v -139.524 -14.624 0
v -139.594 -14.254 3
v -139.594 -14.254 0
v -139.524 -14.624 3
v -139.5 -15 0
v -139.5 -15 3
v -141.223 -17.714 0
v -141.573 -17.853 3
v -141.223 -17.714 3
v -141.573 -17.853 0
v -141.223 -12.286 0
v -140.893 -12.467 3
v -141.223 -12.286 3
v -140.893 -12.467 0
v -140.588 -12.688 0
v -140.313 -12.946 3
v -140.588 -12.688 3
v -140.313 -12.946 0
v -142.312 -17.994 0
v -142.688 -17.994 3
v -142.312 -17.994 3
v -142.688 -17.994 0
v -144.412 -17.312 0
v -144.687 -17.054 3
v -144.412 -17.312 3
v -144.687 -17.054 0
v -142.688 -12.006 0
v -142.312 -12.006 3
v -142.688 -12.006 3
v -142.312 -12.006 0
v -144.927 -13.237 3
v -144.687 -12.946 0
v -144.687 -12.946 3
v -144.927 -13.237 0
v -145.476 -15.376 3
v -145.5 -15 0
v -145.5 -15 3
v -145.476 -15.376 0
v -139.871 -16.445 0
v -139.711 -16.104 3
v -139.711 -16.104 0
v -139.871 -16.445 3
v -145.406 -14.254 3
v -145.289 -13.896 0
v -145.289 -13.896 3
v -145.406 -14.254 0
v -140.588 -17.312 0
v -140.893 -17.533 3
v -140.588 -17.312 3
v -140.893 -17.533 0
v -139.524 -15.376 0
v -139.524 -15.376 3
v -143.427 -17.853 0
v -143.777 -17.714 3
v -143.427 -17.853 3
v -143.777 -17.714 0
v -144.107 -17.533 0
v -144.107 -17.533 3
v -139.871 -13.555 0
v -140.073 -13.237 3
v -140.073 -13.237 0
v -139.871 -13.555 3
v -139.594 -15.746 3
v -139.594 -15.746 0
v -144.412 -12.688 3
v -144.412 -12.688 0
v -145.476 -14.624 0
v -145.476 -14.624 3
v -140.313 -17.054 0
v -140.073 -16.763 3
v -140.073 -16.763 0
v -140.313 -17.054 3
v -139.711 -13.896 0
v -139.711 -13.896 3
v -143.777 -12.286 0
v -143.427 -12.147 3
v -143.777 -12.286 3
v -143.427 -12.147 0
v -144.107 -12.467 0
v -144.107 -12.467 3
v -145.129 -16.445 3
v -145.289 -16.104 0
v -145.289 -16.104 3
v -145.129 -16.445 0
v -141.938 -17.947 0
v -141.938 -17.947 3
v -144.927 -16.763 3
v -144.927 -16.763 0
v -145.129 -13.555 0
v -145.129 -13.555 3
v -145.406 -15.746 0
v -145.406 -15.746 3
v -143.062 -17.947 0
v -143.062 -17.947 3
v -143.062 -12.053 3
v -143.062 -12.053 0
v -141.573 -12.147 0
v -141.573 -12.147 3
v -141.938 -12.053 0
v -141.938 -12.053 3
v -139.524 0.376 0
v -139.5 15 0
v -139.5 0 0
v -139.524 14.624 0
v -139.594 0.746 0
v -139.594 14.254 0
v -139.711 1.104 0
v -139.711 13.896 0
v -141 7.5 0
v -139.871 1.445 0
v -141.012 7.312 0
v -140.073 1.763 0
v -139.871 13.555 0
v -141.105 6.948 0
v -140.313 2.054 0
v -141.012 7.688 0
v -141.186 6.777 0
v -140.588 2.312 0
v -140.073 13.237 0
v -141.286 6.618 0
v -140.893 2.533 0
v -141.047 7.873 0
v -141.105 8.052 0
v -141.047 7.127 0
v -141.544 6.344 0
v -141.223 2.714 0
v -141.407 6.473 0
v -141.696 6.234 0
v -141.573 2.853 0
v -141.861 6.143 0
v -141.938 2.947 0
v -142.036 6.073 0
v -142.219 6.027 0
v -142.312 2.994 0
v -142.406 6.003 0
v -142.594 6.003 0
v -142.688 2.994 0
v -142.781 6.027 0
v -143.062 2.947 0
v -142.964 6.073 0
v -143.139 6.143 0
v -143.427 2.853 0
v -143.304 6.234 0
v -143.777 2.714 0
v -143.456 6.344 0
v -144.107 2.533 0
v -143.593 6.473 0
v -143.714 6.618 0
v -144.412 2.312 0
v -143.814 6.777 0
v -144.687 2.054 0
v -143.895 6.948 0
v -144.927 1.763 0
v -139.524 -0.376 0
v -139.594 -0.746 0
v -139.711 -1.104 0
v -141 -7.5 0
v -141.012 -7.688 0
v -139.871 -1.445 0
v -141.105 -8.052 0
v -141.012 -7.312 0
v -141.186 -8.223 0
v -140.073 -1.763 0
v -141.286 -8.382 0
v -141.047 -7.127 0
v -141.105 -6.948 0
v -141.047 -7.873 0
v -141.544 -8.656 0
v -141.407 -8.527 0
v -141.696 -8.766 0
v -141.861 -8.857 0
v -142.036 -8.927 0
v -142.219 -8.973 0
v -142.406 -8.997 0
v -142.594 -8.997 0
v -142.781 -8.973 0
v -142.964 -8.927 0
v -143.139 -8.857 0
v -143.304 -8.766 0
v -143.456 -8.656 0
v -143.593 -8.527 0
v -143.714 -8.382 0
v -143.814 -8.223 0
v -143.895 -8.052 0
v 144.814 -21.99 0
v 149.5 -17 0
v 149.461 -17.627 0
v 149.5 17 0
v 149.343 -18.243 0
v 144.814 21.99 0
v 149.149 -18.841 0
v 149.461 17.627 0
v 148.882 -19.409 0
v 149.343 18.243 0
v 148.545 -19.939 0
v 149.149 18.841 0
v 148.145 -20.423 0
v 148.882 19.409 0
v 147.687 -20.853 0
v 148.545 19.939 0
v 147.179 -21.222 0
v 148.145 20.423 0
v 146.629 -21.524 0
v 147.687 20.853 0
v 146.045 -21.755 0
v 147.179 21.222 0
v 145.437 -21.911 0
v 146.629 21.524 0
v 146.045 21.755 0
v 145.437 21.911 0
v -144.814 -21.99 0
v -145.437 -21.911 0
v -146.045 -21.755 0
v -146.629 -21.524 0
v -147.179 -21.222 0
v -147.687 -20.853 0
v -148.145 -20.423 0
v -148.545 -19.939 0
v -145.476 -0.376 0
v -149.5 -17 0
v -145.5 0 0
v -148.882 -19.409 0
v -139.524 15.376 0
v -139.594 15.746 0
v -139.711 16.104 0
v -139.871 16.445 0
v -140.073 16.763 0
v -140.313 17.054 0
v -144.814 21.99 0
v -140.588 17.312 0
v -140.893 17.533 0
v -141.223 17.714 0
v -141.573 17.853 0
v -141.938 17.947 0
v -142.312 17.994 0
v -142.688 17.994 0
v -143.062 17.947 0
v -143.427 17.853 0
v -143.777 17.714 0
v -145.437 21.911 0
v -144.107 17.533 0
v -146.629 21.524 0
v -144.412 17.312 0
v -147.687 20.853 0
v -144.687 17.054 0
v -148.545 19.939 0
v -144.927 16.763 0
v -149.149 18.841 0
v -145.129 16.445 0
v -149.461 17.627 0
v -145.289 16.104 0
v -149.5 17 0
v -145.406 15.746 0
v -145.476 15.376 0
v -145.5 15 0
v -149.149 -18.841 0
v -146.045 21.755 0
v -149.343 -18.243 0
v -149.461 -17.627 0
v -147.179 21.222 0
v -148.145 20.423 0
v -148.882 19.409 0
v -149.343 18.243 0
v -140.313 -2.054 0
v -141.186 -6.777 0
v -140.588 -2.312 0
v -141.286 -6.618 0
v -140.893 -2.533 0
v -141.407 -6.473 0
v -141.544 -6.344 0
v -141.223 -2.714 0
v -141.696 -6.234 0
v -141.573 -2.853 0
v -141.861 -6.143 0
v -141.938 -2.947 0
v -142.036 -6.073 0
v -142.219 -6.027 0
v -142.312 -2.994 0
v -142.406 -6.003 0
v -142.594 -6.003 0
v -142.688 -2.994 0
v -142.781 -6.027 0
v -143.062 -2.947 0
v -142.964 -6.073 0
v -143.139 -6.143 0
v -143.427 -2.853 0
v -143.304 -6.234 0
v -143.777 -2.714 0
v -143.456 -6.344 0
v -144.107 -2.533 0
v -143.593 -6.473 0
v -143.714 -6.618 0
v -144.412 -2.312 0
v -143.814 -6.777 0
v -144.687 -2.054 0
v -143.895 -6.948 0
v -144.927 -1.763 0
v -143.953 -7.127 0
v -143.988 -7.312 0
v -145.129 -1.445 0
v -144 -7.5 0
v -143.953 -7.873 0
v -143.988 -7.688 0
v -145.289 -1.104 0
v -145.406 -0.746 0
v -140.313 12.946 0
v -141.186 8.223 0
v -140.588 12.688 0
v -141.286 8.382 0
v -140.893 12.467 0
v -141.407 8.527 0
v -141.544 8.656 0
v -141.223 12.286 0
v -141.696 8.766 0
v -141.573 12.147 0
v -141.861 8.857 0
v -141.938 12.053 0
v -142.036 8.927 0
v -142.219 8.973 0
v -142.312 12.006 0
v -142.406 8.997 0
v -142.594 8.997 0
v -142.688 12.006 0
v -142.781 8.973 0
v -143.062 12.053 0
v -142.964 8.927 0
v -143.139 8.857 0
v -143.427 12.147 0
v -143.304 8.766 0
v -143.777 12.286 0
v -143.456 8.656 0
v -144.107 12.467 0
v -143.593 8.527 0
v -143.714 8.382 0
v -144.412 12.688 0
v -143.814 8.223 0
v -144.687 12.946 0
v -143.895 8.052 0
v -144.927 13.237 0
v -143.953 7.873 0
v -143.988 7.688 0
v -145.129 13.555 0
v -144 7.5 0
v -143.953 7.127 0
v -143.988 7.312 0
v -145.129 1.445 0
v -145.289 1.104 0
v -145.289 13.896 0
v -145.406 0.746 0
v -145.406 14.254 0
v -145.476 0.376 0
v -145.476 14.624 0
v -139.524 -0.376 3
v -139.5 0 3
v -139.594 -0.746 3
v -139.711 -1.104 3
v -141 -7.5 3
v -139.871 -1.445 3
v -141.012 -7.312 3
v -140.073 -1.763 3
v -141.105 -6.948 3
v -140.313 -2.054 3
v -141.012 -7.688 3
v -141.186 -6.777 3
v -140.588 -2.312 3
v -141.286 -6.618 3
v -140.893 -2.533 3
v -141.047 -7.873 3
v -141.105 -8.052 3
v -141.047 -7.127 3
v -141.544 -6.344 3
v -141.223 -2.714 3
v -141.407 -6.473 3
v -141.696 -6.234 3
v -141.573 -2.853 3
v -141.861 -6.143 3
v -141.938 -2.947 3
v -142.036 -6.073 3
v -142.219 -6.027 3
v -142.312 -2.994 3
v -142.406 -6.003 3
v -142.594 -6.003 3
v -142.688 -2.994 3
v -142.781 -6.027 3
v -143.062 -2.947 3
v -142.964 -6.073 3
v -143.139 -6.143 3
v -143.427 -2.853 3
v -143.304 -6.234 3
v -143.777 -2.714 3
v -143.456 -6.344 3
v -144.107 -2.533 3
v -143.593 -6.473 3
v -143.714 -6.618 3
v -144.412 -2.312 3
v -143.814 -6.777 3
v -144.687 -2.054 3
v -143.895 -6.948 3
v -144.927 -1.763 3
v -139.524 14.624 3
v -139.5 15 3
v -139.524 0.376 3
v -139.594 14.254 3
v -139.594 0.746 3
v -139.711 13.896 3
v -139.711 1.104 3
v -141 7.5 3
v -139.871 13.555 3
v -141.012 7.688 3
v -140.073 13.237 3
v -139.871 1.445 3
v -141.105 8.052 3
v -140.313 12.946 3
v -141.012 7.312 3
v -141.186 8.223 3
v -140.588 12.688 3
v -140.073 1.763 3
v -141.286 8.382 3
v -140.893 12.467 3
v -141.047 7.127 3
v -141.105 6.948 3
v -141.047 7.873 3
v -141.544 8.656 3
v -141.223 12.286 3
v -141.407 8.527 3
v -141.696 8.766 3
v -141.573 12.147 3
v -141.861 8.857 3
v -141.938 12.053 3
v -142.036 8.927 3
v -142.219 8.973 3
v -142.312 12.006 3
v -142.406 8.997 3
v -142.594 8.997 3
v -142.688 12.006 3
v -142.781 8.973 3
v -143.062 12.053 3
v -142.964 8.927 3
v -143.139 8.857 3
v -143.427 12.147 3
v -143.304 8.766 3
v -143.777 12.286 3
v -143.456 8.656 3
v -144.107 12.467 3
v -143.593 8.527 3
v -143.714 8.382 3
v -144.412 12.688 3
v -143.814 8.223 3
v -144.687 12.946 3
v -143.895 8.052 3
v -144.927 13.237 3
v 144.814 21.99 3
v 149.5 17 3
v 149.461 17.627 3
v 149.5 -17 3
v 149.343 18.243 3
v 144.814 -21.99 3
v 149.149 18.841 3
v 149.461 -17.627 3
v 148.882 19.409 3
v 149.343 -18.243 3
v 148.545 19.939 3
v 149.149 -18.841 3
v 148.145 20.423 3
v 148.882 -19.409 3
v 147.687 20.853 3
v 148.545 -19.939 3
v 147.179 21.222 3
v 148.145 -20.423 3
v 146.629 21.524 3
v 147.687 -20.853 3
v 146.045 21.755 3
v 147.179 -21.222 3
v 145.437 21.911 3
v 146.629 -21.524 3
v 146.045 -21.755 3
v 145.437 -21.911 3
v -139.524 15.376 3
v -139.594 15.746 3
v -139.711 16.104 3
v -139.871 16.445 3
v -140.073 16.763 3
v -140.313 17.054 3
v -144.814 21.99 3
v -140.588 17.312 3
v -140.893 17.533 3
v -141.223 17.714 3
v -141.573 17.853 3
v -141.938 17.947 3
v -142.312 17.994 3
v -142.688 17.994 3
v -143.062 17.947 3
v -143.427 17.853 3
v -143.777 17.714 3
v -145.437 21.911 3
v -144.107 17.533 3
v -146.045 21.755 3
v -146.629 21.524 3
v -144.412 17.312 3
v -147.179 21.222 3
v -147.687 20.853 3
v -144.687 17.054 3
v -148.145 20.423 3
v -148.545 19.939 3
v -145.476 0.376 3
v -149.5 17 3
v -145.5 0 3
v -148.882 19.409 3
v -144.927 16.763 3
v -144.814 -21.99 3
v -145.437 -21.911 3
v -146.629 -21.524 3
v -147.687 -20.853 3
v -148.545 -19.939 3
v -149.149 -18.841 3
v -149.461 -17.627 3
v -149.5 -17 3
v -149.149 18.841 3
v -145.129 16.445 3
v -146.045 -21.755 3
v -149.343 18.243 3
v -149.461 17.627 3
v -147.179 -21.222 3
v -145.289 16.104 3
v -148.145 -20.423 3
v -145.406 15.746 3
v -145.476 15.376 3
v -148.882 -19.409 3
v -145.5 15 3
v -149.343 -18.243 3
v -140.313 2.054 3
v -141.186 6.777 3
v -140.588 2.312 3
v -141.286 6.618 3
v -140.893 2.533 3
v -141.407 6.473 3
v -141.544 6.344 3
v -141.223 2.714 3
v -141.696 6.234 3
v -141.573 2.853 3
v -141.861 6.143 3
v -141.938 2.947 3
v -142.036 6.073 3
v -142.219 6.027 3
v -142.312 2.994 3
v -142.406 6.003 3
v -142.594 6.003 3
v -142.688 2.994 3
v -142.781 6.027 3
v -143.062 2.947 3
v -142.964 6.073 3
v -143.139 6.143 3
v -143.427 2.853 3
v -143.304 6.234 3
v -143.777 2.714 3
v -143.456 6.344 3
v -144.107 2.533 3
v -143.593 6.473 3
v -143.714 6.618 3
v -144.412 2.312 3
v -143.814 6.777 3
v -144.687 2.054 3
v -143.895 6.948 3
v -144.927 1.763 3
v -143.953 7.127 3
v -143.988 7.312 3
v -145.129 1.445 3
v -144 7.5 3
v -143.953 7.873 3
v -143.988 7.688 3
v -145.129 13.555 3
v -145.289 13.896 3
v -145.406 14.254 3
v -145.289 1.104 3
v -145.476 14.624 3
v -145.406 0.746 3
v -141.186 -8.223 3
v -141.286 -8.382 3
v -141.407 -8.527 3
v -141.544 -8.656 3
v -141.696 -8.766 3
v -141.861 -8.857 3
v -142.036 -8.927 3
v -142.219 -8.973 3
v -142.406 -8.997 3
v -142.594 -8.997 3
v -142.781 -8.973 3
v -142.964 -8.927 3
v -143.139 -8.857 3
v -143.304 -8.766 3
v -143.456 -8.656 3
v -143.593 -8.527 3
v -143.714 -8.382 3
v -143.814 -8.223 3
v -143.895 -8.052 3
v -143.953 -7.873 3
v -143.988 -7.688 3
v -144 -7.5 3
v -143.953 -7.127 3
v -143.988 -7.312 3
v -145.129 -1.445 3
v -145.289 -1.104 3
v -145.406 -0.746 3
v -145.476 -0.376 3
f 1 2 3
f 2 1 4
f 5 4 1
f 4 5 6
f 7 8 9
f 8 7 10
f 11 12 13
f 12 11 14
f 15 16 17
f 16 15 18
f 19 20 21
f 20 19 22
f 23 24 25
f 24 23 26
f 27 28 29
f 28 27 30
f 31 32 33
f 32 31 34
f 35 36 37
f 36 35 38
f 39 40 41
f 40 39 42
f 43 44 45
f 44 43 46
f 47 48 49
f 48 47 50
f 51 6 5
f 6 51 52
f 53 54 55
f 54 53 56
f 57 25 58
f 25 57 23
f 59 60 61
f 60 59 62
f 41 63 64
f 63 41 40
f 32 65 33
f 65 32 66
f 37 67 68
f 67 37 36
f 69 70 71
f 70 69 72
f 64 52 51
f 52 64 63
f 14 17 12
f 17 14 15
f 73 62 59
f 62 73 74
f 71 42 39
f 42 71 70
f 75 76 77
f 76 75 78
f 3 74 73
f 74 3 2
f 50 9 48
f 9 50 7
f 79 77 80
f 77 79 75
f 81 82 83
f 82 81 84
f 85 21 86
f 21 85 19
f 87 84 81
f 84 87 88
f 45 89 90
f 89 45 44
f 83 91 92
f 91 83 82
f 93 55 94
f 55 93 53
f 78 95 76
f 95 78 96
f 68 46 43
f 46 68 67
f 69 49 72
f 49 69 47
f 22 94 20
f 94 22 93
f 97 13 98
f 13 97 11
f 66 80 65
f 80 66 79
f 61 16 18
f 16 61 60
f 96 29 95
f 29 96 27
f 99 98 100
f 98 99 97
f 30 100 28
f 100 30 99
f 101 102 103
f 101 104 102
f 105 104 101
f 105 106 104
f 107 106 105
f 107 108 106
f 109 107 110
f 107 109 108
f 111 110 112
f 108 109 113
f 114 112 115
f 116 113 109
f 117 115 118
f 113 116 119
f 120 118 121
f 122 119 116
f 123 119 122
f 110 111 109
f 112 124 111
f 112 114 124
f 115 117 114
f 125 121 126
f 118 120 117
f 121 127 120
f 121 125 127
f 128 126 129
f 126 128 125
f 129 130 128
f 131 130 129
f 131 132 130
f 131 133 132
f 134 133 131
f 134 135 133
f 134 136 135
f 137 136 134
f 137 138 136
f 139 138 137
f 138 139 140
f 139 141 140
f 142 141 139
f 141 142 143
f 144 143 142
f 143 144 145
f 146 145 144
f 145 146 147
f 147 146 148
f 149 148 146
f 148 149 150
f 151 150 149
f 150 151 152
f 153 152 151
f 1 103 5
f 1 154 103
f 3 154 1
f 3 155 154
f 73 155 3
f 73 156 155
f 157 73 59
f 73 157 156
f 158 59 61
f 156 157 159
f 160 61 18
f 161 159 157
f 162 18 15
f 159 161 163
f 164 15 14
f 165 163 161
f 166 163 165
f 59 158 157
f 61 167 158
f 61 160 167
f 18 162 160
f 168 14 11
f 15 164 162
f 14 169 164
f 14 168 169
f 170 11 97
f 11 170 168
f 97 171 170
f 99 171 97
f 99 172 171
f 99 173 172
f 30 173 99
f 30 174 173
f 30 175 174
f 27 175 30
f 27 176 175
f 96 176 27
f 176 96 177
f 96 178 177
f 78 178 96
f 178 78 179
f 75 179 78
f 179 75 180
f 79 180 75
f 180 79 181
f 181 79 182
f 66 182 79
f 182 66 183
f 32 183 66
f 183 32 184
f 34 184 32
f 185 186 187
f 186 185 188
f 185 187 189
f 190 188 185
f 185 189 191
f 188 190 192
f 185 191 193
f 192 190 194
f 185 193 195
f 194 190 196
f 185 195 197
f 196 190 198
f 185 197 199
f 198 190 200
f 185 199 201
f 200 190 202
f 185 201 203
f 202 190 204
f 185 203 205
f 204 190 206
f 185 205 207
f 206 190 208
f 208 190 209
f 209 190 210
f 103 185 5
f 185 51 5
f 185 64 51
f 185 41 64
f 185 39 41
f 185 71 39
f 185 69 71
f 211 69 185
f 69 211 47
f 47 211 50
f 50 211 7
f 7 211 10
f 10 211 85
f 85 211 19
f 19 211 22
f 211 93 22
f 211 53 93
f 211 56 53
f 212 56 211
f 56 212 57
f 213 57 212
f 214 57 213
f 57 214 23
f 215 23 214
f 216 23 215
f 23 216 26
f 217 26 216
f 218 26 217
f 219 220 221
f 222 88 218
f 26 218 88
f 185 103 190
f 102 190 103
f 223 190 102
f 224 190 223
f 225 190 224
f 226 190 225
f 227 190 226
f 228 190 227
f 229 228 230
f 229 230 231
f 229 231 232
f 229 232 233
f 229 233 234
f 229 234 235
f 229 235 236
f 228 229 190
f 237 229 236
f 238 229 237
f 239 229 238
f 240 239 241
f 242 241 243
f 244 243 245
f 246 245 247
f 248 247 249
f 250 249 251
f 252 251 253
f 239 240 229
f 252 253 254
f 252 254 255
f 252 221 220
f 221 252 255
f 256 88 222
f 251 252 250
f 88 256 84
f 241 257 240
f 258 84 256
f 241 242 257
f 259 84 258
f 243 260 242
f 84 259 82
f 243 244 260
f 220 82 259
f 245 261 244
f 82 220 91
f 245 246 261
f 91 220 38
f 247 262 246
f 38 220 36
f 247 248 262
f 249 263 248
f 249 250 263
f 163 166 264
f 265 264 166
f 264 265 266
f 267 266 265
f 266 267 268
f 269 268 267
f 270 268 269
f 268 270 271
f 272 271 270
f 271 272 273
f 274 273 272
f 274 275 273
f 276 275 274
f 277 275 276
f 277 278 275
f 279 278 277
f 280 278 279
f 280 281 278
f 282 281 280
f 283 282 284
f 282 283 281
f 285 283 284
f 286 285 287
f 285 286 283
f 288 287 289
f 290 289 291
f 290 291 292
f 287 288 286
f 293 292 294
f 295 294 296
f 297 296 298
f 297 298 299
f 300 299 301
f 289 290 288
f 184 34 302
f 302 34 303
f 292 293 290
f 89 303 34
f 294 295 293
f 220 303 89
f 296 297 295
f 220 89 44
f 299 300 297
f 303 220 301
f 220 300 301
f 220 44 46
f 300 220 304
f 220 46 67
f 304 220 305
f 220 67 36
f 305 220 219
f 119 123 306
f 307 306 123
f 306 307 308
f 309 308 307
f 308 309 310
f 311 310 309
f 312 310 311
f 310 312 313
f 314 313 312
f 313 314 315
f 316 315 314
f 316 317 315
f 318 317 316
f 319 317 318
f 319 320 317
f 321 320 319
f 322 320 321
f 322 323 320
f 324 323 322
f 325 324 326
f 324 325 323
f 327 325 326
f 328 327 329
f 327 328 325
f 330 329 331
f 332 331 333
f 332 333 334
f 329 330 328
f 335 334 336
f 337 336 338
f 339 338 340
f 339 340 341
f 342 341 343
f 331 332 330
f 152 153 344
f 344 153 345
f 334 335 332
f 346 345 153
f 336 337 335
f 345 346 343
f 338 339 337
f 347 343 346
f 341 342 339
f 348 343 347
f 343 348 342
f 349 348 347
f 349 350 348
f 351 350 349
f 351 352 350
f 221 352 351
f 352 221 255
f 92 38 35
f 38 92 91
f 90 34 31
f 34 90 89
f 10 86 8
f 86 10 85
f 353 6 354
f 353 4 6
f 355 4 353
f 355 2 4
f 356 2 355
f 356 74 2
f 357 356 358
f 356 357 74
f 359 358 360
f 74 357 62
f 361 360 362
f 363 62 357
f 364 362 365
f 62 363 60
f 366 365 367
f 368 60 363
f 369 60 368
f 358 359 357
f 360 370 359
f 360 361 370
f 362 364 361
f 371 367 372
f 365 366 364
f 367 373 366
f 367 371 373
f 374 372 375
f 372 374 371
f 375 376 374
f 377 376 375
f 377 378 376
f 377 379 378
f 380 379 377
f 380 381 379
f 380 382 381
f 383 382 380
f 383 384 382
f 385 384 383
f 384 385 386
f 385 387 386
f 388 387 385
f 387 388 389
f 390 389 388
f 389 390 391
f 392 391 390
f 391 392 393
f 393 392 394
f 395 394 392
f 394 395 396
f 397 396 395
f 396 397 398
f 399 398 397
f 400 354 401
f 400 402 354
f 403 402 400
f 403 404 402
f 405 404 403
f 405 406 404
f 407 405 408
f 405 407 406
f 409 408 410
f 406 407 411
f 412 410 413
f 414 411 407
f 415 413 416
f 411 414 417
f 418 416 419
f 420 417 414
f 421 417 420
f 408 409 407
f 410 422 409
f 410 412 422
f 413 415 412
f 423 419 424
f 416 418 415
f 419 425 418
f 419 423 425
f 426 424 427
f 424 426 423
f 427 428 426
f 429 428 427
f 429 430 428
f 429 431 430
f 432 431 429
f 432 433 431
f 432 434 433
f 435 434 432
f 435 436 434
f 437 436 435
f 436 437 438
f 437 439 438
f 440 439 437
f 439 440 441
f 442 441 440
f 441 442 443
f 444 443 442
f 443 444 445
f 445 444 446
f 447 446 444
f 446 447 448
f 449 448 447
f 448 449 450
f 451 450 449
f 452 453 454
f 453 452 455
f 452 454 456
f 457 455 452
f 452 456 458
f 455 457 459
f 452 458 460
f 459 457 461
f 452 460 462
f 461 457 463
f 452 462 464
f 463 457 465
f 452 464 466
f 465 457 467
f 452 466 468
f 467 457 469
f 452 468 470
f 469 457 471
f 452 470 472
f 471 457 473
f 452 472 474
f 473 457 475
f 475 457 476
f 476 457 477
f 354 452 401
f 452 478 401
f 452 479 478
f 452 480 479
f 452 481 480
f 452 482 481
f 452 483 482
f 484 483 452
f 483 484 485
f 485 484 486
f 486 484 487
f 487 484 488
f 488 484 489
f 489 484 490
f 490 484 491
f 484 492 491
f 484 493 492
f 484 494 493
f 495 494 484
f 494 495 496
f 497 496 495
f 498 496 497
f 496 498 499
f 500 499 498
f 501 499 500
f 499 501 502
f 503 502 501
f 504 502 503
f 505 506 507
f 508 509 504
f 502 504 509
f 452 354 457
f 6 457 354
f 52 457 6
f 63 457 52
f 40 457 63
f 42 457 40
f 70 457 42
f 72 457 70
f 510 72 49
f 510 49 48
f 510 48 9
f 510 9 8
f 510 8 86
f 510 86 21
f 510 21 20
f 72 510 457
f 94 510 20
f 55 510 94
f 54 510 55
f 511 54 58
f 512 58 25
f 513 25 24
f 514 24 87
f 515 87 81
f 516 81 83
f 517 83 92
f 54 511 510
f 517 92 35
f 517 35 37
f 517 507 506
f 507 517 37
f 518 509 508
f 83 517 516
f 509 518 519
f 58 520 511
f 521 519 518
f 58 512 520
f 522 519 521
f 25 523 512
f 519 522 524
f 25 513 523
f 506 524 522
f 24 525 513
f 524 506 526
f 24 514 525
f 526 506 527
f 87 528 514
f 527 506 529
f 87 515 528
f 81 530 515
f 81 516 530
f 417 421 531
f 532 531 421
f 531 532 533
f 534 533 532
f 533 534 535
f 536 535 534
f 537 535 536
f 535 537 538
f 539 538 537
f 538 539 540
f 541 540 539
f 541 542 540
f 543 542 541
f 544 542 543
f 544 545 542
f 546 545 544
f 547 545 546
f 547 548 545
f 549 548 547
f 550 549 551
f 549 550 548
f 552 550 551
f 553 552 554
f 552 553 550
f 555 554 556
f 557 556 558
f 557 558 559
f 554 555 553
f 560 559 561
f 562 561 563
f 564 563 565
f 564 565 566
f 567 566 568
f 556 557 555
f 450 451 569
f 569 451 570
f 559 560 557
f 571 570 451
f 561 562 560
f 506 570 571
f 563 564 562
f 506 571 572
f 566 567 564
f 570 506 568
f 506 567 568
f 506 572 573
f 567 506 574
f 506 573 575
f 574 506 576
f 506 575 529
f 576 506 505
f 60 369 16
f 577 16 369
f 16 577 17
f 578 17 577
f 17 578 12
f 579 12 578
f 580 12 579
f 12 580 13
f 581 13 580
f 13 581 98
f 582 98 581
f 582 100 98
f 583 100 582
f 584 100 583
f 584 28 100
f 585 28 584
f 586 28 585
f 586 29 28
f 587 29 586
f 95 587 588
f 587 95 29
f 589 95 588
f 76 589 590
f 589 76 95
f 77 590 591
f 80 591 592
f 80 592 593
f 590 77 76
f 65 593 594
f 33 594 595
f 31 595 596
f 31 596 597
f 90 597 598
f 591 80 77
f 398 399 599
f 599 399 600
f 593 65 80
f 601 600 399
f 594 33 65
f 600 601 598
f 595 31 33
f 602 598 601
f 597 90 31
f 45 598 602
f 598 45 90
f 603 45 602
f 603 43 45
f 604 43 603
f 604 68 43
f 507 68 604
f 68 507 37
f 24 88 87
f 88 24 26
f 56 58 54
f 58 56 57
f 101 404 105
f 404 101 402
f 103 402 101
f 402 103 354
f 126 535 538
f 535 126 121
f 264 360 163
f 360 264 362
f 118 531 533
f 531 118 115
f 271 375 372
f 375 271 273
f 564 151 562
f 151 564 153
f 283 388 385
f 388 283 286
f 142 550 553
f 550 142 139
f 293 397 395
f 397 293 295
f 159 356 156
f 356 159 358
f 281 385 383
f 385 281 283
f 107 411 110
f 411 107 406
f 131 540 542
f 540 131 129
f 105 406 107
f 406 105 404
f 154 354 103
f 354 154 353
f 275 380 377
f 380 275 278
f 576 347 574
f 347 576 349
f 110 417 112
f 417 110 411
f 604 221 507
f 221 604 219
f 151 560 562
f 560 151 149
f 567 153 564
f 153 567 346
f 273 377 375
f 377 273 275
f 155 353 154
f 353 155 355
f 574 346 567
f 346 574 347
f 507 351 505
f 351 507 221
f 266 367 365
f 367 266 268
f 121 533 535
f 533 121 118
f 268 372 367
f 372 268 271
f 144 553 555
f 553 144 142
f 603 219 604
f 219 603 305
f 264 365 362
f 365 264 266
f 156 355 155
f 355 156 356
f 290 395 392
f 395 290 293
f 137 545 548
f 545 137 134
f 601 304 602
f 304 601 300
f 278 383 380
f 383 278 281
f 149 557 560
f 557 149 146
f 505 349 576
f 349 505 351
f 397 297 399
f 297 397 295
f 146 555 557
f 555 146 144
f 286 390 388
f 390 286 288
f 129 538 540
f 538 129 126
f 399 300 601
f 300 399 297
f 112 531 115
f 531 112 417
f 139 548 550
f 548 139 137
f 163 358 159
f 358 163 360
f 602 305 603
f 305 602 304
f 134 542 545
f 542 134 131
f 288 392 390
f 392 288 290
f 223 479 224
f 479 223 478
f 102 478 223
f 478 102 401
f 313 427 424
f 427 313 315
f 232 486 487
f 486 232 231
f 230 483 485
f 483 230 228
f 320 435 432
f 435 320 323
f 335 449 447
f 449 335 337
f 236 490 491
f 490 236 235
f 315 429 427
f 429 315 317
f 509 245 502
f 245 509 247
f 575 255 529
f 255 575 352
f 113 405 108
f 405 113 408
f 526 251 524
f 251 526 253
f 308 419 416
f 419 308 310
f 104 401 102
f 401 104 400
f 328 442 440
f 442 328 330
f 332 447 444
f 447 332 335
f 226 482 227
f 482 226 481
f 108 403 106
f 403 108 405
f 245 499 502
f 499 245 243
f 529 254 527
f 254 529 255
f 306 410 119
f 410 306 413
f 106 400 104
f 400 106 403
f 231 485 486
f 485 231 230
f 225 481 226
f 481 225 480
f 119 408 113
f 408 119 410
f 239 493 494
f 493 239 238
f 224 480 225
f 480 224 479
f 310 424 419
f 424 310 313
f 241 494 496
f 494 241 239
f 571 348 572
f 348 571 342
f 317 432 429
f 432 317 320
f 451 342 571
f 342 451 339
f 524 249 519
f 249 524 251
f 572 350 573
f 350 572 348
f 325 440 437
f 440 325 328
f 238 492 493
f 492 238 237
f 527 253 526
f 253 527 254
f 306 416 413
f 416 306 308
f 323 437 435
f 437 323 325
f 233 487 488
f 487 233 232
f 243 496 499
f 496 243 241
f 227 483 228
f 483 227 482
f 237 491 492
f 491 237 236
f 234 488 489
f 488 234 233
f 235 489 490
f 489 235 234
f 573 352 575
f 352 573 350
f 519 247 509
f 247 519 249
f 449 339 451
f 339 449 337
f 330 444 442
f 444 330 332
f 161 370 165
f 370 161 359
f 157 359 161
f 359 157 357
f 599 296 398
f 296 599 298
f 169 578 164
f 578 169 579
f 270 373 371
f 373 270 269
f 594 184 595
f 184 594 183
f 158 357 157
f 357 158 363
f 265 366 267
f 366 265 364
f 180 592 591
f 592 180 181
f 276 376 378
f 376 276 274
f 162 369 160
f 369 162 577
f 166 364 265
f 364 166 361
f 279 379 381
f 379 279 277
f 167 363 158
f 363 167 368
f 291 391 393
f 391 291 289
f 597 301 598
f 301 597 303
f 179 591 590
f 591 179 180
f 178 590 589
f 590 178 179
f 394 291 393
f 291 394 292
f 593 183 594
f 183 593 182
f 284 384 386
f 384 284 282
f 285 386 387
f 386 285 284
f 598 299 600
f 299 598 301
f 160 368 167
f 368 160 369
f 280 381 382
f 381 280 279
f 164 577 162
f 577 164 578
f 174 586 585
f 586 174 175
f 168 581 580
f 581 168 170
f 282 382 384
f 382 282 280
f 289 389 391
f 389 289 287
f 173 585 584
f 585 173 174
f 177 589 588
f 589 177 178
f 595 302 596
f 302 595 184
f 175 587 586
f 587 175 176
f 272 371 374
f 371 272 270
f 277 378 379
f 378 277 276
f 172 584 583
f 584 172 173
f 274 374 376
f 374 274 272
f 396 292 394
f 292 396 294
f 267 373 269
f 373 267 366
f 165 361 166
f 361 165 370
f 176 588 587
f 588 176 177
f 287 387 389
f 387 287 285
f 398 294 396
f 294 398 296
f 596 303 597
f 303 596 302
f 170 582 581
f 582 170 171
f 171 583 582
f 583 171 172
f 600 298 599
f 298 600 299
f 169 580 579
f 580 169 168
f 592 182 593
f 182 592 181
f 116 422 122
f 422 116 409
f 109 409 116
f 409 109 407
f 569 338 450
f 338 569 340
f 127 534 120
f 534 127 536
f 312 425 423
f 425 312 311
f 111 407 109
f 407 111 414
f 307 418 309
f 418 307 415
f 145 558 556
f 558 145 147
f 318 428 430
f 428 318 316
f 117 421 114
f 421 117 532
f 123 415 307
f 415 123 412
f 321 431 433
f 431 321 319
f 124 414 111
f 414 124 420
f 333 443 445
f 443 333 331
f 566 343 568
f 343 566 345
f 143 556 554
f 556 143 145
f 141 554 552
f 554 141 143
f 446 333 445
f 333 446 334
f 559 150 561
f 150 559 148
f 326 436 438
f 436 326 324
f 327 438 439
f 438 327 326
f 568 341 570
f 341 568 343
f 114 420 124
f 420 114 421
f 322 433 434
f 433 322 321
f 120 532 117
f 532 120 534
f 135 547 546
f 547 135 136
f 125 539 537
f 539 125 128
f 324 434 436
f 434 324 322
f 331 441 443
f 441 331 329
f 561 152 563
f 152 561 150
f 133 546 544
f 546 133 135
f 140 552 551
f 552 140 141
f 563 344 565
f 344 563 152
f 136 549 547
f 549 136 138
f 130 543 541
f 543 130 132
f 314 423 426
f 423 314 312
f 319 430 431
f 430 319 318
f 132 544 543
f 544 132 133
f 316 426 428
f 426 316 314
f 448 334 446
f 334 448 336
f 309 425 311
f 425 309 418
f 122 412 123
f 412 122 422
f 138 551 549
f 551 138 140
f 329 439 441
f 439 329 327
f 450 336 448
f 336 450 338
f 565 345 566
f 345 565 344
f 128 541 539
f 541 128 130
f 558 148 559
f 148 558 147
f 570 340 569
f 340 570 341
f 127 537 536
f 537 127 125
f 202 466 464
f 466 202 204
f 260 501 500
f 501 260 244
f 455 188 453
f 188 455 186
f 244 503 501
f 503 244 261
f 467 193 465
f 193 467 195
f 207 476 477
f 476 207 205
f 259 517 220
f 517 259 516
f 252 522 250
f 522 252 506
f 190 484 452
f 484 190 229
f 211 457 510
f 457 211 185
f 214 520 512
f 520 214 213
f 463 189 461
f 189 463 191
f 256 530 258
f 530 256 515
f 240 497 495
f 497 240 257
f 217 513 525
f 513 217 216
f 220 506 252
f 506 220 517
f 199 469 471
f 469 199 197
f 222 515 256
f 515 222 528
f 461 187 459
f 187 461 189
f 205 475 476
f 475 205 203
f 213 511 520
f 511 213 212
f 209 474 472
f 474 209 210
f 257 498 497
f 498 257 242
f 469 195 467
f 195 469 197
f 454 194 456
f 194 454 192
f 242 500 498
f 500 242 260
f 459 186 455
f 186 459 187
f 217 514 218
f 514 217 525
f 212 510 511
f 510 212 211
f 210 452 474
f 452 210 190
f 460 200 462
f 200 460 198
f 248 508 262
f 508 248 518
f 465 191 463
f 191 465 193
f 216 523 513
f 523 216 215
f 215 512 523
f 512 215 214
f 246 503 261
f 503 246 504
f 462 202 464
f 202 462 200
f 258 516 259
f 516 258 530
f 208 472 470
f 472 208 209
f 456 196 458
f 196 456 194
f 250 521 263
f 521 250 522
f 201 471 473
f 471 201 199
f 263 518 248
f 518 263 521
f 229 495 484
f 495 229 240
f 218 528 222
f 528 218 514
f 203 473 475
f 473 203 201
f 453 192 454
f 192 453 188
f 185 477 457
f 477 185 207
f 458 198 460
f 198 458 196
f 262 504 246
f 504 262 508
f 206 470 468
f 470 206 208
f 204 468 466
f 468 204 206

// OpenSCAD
$fn = 50;


difference() {
	union() {
		hull() {
			translate(v = [-144.5000000000, 17.0000000000, 0]) {
				cylinder(h = 3, r = 5);
			}
			translate(v = [144.5000000000, 17.0000000000, 0]) {
				cylinder(h = 3, r = 5);
			}
			translate(v = [-144.5000000000, -17.0000000000, 0]) {
				cylinder(h = 3, r = 5);
			}
			translate(v = [144.5000000000, -17.0000000000, 0]) {
				cylinder(h = 3, r = 5);
			}
		}
	}
	union() {
		translate(v = [-142.5000000000, -15.0000000000, 0]) {
			cylinder(h = 3, r = 3.0000000000);
		}
		translate(v = [-142.5000000000, 0.0000000000, 0]) {
			cylinder(h = 3, r = 3.0000000000);
		}
		translate(v = [-142.5000000000, 15.0000000000, 0]) {
			cylinder(h = 3, r = 3.0000000000);
		}
		translate(v = [-142.5000000000, -15.0000000000, 0]) {
			cylinder(h = 3, r = 1.5000000000);
		}
		translate(v = [-142.5000000000, -7.5000000000, 0]) {
			cylinder(h = 3, r = 1.5000000000);
		}
		translate(v = [-142.5000000000, 0.0000000000, 0]) {
			cylinder(h = 3, r = 1.5000000000);
		}
		translate(v = [-142.5000000000, 7.5000000000, 0]) {
			cylinder(h = 3, r = 1.5000000000);
		}
		translate(v = [-142.5000000000, 15.0000000000, 0]) {
			cylinder(h = 3, r = 1.5000000000);
		}
		translate(v = [-142.5000000000, -15.0000000000, 0]) {
			cylinder(h = 3, r = 1.5000000000);
		}
		translate(v = [-142.5000000000, -7.5000000000, 0]) {
			cylinder(h = 3, r = 1.5000000000);
		}
		translate(v = [-142.5000000000, 0.0000000000, 0]) {
			cylinder(h = 3, r = 1.5000000000);
		}
		translate(v = [-142.5000000000, 7.5000000000, 0]) {
			cylinder(h = 3, r = 1.5000000000);
		}
		translate(v = [-142.5000000000, 15.0000000000, 0]) {
			cylinder(h = 3, r = 1.5000000000);
		}
		translate(v = [-142.5000000000, -15.0000000000, 0]) {
			cylinder(h = 3, r = 1.5000000000);
		}
		translate(v = [-142.5000000000, -7.5000000000, 0]) {
			cylinder(h = 3, r = 1.5000000000);
		}
		translate(v = [-142.5000000000, 0.0000000000, 0]) {
			cylinder(h = 3, r = 1.5000000000);
		}
		translate(v = [-142.5000000000, 7.5000000000, 0]) {
			cylinder(h = 3, r = 1.5000000000);
		}
		translate(v = [-142.5000000000, 15.0000000000, 0]) {
			cylinder(h = 3, r = 1.5000000000);
		}
	}
}
